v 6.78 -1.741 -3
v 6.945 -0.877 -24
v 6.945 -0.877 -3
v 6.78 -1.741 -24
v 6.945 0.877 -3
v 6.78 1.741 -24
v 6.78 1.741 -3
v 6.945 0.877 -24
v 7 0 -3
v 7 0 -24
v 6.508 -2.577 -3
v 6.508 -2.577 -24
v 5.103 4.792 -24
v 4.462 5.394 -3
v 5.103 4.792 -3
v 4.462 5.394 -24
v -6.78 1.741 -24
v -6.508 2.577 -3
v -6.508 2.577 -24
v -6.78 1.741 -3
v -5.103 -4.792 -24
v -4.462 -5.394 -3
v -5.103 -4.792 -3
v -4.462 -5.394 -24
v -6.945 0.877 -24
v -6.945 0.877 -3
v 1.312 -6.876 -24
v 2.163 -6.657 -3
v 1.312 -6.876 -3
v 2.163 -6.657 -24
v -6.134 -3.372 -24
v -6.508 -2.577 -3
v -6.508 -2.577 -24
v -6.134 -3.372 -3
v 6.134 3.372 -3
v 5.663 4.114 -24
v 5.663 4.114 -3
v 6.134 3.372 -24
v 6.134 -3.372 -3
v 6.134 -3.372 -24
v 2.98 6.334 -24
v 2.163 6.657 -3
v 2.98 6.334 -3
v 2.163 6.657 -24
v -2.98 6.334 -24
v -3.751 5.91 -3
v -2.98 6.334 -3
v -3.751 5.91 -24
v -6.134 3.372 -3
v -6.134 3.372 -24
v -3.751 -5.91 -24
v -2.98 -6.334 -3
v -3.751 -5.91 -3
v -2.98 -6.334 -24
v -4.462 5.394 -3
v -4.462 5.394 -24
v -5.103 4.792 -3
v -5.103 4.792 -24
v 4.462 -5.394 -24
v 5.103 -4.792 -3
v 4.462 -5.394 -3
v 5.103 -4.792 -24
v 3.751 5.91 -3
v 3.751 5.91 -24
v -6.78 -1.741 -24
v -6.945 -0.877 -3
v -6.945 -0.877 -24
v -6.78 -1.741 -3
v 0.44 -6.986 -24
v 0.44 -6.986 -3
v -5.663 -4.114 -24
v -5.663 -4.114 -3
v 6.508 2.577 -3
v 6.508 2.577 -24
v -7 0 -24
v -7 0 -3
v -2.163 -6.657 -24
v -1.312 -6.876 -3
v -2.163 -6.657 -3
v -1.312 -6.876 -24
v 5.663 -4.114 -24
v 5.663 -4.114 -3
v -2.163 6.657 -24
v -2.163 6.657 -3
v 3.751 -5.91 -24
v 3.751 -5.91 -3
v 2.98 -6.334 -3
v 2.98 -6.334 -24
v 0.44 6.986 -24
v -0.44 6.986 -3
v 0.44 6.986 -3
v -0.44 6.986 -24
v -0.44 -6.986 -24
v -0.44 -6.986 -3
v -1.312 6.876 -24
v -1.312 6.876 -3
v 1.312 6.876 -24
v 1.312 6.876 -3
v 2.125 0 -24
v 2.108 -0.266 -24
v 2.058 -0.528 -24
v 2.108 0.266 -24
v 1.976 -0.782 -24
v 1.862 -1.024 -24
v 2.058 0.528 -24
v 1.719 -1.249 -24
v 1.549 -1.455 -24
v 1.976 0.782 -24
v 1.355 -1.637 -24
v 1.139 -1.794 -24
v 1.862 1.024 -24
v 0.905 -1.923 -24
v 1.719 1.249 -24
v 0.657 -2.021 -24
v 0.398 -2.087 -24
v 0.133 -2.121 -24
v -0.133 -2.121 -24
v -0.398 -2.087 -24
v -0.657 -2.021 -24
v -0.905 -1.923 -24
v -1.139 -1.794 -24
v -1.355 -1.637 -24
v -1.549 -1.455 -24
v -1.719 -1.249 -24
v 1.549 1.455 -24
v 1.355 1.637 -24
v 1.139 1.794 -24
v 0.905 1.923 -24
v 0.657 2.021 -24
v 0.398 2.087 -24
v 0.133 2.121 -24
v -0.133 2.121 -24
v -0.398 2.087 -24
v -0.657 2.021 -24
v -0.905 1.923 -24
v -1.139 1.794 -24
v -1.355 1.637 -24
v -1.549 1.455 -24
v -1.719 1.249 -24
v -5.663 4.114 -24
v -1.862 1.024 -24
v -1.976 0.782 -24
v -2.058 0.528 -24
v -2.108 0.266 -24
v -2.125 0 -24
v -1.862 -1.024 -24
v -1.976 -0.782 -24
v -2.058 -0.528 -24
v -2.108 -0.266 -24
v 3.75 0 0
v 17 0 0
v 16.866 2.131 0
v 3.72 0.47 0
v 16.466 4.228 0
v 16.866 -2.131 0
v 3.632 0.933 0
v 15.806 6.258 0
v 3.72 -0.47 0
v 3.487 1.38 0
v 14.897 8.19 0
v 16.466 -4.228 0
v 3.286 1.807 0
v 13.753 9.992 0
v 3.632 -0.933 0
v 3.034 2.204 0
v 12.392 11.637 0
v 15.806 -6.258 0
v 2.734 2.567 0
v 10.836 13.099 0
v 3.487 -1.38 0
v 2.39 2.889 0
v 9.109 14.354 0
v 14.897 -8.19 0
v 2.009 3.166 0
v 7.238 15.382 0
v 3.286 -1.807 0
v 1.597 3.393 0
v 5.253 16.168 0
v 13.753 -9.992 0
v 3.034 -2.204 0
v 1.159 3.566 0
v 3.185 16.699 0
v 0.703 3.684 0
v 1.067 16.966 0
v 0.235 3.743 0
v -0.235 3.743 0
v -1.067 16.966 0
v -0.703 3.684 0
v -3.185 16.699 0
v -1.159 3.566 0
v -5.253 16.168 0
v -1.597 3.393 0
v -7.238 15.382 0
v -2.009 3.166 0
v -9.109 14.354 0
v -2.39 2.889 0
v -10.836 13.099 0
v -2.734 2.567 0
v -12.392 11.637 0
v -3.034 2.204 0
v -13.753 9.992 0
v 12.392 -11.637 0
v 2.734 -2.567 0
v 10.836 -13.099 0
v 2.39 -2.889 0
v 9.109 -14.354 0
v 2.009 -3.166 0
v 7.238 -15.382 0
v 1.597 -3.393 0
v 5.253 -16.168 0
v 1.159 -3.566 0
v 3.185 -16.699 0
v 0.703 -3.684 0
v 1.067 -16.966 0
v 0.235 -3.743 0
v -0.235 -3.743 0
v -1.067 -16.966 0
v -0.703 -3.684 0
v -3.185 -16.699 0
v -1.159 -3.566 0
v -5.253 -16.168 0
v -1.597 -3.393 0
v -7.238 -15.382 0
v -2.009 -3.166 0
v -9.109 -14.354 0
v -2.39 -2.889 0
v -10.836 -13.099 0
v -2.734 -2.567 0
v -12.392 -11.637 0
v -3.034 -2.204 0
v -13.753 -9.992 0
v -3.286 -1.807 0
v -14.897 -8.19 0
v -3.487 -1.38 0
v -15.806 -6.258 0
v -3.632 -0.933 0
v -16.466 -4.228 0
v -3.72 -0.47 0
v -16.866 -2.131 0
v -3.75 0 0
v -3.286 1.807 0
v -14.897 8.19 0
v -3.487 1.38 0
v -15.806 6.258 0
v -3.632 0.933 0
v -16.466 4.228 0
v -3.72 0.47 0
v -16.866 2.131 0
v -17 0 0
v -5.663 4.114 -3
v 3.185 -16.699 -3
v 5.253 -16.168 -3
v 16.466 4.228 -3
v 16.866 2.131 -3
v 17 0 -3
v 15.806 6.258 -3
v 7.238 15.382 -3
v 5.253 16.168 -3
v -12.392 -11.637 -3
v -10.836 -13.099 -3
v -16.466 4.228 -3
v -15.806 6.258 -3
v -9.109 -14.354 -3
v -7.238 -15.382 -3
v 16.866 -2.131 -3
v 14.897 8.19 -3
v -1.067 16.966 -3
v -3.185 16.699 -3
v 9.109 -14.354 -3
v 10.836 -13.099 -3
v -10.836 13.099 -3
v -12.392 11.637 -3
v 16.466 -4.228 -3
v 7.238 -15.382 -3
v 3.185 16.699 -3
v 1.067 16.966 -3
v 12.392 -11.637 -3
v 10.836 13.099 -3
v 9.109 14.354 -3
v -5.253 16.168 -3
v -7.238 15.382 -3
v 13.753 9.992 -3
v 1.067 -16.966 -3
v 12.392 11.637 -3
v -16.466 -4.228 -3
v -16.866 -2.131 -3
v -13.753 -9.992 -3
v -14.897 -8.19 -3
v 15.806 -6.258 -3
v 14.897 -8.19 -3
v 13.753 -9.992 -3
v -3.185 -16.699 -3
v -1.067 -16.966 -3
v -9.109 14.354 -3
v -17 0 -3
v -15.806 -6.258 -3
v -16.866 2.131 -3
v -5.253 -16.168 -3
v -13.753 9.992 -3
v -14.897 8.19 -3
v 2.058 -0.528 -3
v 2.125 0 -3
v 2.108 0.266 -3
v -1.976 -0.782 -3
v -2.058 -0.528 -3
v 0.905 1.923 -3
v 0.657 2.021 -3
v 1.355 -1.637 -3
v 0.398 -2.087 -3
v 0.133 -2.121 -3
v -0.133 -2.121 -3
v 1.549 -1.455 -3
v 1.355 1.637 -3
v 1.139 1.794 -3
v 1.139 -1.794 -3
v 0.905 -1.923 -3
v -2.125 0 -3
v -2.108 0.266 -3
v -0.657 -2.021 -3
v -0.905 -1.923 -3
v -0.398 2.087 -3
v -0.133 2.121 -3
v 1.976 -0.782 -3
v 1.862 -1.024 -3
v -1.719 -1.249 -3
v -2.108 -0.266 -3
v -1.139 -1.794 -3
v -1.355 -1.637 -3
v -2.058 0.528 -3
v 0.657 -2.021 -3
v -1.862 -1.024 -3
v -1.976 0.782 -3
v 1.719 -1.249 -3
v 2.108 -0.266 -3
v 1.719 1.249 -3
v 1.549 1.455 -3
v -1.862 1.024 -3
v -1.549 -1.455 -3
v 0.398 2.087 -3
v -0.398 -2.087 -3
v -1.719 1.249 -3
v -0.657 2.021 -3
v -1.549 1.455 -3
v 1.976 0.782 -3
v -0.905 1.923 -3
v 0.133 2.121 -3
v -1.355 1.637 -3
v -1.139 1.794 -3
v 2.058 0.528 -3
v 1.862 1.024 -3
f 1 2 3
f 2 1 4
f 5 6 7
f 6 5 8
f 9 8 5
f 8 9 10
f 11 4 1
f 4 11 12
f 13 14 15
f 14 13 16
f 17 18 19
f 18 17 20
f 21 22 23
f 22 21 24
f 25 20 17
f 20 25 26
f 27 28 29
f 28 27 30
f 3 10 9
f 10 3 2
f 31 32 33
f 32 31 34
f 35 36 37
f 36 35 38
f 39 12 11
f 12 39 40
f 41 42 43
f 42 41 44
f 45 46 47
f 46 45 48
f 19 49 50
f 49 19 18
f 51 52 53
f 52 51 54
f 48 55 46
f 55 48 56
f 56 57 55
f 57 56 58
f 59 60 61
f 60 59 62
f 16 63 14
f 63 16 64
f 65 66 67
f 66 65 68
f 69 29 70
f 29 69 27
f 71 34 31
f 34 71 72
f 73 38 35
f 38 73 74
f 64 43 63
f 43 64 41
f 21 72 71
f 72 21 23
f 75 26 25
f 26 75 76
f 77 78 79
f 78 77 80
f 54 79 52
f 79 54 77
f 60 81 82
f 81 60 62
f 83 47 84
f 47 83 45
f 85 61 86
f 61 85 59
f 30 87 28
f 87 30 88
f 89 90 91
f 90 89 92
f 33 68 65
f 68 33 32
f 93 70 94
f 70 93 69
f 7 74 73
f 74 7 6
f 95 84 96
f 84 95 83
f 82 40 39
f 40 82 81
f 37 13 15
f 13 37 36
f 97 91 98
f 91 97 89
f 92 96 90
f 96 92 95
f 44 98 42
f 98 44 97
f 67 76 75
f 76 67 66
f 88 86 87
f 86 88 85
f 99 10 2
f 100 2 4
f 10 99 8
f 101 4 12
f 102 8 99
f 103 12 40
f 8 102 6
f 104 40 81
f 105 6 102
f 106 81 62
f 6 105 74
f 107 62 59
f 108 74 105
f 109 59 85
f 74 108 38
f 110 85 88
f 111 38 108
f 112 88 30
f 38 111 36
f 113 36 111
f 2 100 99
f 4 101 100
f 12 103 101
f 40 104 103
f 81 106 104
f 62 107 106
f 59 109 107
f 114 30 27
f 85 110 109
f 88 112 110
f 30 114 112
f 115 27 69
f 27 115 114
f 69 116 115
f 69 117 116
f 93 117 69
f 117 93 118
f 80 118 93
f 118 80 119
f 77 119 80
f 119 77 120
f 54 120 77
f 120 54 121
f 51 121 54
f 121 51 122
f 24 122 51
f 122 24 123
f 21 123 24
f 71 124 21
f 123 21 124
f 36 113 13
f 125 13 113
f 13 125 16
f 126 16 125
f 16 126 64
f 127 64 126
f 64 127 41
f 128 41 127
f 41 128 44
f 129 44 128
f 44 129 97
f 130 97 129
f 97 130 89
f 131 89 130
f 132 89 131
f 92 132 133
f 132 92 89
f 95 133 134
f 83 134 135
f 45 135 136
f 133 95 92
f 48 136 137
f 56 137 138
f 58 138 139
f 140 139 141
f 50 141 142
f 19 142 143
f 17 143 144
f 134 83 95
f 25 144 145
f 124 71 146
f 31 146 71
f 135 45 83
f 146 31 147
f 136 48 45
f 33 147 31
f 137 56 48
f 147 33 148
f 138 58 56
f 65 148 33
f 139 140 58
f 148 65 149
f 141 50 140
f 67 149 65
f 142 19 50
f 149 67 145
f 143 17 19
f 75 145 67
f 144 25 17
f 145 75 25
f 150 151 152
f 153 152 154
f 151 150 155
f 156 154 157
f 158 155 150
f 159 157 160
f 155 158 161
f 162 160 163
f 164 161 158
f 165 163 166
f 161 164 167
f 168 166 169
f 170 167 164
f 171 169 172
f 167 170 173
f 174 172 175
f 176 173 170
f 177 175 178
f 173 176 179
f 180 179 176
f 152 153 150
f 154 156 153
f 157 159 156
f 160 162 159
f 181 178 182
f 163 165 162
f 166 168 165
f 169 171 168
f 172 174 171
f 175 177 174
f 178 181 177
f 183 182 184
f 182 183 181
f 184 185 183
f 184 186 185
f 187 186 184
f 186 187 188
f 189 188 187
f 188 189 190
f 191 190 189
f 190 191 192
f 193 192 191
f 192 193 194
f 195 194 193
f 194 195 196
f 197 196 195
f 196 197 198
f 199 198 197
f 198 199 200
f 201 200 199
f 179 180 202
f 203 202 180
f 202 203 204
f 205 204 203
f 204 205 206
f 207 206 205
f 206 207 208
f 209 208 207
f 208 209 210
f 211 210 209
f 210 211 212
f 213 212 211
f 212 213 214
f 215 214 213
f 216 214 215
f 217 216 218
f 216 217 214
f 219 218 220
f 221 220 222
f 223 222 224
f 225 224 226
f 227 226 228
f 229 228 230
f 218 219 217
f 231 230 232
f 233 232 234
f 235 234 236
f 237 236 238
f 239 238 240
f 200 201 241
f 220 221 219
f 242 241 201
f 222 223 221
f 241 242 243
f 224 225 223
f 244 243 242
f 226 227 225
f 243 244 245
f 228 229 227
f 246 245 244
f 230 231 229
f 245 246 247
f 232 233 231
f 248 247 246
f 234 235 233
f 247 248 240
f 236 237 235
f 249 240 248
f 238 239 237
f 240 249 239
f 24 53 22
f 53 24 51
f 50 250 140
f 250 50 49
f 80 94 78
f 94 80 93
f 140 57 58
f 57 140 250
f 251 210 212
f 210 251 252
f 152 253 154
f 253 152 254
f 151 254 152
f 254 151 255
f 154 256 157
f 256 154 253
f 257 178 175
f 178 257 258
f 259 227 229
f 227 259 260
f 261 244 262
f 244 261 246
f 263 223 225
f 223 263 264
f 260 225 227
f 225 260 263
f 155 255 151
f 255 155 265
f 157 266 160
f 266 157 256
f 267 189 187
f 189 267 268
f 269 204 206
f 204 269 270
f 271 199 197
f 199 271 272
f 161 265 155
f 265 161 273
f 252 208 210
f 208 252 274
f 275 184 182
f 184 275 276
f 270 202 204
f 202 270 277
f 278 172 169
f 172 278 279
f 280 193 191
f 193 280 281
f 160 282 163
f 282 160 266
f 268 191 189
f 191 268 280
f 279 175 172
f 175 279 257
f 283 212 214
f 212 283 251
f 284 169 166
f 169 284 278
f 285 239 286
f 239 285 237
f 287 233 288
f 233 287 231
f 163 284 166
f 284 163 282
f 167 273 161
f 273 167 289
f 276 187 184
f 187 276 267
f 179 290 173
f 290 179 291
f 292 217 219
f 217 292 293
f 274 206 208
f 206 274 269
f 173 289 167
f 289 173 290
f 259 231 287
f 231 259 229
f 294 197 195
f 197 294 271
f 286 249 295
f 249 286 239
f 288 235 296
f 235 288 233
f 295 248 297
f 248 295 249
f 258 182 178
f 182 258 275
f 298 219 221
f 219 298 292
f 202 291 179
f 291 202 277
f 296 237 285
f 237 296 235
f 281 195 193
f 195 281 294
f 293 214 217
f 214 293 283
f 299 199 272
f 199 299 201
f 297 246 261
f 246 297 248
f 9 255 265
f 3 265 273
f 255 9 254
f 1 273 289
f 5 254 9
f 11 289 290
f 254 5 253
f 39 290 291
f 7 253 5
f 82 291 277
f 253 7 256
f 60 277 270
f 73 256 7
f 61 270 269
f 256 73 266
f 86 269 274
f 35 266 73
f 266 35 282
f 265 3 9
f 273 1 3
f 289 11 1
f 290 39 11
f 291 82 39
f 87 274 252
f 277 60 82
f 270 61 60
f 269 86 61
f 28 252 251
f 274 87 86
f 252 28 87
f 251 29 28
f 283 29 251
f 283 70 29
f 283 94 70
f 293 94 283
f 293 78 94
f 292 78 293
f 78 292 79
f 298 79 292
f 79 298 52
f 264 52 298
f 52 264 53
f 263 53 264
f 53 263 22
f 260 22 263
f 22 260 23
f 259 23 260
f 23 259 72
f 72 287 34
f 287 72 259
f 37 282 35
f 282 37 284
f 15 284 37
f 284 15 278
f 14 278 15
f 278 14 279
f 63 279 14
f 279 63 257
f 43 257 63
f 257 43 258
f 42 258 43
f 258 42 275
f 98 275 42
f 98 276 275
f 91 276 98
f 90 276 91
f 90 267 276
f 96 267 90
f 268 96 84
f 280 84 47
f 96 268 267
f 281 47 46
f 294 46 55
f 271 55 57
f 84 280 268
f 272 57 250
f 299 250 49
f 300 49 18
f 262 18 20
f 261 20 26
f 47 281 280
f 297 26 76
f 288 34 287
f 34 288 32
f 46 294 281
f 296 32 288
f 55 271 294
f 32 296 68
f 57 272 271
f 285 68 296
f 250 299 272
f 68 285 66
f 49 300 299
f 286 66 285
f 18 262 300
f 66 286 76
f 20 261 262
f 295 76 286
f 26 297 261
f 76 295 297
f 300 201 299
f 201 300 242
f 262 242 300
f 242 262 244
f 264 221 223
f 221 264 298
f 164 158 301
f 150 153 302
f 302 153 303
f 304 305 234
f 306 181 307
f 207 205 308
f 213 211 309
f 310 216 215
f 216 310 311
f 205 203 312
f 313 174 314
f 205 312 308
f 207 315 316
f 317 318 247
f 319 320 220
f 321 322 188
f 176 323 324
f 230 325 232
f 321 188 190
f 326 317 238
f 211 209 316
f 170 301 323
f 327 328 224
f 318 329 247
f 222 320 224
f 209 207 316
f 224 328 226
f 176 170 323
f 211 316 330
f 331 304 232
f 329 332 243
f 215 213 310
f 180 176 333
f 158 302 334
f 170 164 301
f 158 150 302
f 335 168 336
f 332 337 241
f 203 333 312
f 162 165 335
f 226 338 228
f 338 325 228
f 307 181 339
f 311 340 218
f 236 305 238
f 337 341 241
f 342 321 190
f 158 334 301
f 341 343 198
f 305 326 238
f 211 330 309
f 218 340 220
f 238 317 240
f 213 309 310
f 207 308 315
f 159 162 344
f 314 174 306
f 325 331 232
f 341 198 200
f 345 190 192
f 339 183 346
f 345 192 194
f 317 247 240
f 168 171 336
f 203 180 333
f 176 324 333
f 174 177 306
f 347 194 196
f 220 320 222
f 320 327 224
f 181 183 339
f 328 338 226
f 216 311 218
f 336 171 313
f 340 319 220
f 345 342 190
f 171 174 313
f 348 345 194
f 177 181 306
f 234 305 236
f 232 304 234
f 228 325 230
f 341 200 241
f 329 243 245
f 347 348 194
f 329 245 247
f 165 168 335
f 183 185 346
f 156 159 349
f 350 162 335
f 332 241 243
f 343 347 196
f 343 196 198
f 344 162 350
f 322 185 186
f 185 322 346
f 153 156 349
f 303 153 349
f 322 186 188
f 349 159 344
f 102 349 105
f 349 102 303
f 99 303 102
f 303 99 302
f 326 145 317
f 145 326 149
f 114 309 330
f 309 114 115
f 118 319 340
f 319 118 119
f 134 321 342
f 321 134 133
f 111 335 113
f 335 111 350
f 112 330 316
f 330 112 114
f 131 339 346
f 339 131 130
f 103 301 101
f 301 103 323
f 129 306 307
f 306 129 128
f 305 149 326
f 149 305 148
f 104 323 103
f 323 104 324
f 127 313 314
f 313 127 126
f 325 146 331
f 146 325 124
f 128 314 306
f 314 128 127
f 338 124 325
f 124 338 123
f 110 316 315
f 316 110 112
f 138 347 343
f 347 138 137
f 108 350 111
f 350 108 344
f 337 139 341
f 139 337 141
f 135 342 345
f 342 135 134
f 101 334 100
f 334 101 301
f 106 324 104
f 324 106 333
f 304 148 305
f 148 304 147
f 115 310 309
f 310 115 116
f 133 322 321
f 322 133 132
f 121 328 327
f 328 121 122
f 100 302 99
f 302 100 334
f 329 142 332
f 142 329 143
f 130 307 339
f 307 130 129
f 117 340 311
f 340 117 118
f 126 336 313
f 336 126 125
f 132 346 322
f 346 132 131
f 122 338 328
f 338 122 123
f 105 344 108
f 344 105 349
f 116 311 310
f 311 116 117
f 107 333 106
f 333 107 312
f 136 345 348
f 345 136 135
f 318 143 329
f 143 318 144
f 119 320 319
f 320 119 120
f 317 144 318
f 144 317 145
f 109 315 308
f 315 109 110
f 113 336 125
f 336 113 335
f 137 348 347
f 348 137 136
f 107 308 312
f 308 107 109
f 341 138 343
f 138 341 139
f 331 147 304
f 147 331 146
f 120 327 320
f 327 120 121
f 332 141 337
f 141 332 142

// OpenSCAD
$fn = 50;


difference() {
	union() {
		translate(v = [0, 0, -24.0000000000]) {
			cylinder(h = 24, r = 7.0000000000);
		}
		translate(v = [0, 0, -3.0000000000]) {
			cylinder(h = 3, r = 17.0000000000);
		}
	}
	union() {
		translate(v = [0, 0, 0]) {
			rotate(a = [0, 0, 0]) {
				difference() {
					union() {
						#translate(v = [0, 0, -24.0000000000]) {
							cylinder(h = 24, r = 2.0000000000);
						}
						#translate(v = [0, 0, -3]) {
							cylinder(h = 3, r = 7.0000000000, r1 = 2.1250000000, r2 = 3.7500000000);
						}
						#translate(v = [0, 0, -24.0000000000]) {
							cylinder(h = 24, r = 2.1250000000);
						}
						#translate(v = [0, 0, -24.0000000000]) {
							cylinder(h = 24, r = 2.0000000000);
						}
					}
					union();
				}
			}
		}
	}
}
